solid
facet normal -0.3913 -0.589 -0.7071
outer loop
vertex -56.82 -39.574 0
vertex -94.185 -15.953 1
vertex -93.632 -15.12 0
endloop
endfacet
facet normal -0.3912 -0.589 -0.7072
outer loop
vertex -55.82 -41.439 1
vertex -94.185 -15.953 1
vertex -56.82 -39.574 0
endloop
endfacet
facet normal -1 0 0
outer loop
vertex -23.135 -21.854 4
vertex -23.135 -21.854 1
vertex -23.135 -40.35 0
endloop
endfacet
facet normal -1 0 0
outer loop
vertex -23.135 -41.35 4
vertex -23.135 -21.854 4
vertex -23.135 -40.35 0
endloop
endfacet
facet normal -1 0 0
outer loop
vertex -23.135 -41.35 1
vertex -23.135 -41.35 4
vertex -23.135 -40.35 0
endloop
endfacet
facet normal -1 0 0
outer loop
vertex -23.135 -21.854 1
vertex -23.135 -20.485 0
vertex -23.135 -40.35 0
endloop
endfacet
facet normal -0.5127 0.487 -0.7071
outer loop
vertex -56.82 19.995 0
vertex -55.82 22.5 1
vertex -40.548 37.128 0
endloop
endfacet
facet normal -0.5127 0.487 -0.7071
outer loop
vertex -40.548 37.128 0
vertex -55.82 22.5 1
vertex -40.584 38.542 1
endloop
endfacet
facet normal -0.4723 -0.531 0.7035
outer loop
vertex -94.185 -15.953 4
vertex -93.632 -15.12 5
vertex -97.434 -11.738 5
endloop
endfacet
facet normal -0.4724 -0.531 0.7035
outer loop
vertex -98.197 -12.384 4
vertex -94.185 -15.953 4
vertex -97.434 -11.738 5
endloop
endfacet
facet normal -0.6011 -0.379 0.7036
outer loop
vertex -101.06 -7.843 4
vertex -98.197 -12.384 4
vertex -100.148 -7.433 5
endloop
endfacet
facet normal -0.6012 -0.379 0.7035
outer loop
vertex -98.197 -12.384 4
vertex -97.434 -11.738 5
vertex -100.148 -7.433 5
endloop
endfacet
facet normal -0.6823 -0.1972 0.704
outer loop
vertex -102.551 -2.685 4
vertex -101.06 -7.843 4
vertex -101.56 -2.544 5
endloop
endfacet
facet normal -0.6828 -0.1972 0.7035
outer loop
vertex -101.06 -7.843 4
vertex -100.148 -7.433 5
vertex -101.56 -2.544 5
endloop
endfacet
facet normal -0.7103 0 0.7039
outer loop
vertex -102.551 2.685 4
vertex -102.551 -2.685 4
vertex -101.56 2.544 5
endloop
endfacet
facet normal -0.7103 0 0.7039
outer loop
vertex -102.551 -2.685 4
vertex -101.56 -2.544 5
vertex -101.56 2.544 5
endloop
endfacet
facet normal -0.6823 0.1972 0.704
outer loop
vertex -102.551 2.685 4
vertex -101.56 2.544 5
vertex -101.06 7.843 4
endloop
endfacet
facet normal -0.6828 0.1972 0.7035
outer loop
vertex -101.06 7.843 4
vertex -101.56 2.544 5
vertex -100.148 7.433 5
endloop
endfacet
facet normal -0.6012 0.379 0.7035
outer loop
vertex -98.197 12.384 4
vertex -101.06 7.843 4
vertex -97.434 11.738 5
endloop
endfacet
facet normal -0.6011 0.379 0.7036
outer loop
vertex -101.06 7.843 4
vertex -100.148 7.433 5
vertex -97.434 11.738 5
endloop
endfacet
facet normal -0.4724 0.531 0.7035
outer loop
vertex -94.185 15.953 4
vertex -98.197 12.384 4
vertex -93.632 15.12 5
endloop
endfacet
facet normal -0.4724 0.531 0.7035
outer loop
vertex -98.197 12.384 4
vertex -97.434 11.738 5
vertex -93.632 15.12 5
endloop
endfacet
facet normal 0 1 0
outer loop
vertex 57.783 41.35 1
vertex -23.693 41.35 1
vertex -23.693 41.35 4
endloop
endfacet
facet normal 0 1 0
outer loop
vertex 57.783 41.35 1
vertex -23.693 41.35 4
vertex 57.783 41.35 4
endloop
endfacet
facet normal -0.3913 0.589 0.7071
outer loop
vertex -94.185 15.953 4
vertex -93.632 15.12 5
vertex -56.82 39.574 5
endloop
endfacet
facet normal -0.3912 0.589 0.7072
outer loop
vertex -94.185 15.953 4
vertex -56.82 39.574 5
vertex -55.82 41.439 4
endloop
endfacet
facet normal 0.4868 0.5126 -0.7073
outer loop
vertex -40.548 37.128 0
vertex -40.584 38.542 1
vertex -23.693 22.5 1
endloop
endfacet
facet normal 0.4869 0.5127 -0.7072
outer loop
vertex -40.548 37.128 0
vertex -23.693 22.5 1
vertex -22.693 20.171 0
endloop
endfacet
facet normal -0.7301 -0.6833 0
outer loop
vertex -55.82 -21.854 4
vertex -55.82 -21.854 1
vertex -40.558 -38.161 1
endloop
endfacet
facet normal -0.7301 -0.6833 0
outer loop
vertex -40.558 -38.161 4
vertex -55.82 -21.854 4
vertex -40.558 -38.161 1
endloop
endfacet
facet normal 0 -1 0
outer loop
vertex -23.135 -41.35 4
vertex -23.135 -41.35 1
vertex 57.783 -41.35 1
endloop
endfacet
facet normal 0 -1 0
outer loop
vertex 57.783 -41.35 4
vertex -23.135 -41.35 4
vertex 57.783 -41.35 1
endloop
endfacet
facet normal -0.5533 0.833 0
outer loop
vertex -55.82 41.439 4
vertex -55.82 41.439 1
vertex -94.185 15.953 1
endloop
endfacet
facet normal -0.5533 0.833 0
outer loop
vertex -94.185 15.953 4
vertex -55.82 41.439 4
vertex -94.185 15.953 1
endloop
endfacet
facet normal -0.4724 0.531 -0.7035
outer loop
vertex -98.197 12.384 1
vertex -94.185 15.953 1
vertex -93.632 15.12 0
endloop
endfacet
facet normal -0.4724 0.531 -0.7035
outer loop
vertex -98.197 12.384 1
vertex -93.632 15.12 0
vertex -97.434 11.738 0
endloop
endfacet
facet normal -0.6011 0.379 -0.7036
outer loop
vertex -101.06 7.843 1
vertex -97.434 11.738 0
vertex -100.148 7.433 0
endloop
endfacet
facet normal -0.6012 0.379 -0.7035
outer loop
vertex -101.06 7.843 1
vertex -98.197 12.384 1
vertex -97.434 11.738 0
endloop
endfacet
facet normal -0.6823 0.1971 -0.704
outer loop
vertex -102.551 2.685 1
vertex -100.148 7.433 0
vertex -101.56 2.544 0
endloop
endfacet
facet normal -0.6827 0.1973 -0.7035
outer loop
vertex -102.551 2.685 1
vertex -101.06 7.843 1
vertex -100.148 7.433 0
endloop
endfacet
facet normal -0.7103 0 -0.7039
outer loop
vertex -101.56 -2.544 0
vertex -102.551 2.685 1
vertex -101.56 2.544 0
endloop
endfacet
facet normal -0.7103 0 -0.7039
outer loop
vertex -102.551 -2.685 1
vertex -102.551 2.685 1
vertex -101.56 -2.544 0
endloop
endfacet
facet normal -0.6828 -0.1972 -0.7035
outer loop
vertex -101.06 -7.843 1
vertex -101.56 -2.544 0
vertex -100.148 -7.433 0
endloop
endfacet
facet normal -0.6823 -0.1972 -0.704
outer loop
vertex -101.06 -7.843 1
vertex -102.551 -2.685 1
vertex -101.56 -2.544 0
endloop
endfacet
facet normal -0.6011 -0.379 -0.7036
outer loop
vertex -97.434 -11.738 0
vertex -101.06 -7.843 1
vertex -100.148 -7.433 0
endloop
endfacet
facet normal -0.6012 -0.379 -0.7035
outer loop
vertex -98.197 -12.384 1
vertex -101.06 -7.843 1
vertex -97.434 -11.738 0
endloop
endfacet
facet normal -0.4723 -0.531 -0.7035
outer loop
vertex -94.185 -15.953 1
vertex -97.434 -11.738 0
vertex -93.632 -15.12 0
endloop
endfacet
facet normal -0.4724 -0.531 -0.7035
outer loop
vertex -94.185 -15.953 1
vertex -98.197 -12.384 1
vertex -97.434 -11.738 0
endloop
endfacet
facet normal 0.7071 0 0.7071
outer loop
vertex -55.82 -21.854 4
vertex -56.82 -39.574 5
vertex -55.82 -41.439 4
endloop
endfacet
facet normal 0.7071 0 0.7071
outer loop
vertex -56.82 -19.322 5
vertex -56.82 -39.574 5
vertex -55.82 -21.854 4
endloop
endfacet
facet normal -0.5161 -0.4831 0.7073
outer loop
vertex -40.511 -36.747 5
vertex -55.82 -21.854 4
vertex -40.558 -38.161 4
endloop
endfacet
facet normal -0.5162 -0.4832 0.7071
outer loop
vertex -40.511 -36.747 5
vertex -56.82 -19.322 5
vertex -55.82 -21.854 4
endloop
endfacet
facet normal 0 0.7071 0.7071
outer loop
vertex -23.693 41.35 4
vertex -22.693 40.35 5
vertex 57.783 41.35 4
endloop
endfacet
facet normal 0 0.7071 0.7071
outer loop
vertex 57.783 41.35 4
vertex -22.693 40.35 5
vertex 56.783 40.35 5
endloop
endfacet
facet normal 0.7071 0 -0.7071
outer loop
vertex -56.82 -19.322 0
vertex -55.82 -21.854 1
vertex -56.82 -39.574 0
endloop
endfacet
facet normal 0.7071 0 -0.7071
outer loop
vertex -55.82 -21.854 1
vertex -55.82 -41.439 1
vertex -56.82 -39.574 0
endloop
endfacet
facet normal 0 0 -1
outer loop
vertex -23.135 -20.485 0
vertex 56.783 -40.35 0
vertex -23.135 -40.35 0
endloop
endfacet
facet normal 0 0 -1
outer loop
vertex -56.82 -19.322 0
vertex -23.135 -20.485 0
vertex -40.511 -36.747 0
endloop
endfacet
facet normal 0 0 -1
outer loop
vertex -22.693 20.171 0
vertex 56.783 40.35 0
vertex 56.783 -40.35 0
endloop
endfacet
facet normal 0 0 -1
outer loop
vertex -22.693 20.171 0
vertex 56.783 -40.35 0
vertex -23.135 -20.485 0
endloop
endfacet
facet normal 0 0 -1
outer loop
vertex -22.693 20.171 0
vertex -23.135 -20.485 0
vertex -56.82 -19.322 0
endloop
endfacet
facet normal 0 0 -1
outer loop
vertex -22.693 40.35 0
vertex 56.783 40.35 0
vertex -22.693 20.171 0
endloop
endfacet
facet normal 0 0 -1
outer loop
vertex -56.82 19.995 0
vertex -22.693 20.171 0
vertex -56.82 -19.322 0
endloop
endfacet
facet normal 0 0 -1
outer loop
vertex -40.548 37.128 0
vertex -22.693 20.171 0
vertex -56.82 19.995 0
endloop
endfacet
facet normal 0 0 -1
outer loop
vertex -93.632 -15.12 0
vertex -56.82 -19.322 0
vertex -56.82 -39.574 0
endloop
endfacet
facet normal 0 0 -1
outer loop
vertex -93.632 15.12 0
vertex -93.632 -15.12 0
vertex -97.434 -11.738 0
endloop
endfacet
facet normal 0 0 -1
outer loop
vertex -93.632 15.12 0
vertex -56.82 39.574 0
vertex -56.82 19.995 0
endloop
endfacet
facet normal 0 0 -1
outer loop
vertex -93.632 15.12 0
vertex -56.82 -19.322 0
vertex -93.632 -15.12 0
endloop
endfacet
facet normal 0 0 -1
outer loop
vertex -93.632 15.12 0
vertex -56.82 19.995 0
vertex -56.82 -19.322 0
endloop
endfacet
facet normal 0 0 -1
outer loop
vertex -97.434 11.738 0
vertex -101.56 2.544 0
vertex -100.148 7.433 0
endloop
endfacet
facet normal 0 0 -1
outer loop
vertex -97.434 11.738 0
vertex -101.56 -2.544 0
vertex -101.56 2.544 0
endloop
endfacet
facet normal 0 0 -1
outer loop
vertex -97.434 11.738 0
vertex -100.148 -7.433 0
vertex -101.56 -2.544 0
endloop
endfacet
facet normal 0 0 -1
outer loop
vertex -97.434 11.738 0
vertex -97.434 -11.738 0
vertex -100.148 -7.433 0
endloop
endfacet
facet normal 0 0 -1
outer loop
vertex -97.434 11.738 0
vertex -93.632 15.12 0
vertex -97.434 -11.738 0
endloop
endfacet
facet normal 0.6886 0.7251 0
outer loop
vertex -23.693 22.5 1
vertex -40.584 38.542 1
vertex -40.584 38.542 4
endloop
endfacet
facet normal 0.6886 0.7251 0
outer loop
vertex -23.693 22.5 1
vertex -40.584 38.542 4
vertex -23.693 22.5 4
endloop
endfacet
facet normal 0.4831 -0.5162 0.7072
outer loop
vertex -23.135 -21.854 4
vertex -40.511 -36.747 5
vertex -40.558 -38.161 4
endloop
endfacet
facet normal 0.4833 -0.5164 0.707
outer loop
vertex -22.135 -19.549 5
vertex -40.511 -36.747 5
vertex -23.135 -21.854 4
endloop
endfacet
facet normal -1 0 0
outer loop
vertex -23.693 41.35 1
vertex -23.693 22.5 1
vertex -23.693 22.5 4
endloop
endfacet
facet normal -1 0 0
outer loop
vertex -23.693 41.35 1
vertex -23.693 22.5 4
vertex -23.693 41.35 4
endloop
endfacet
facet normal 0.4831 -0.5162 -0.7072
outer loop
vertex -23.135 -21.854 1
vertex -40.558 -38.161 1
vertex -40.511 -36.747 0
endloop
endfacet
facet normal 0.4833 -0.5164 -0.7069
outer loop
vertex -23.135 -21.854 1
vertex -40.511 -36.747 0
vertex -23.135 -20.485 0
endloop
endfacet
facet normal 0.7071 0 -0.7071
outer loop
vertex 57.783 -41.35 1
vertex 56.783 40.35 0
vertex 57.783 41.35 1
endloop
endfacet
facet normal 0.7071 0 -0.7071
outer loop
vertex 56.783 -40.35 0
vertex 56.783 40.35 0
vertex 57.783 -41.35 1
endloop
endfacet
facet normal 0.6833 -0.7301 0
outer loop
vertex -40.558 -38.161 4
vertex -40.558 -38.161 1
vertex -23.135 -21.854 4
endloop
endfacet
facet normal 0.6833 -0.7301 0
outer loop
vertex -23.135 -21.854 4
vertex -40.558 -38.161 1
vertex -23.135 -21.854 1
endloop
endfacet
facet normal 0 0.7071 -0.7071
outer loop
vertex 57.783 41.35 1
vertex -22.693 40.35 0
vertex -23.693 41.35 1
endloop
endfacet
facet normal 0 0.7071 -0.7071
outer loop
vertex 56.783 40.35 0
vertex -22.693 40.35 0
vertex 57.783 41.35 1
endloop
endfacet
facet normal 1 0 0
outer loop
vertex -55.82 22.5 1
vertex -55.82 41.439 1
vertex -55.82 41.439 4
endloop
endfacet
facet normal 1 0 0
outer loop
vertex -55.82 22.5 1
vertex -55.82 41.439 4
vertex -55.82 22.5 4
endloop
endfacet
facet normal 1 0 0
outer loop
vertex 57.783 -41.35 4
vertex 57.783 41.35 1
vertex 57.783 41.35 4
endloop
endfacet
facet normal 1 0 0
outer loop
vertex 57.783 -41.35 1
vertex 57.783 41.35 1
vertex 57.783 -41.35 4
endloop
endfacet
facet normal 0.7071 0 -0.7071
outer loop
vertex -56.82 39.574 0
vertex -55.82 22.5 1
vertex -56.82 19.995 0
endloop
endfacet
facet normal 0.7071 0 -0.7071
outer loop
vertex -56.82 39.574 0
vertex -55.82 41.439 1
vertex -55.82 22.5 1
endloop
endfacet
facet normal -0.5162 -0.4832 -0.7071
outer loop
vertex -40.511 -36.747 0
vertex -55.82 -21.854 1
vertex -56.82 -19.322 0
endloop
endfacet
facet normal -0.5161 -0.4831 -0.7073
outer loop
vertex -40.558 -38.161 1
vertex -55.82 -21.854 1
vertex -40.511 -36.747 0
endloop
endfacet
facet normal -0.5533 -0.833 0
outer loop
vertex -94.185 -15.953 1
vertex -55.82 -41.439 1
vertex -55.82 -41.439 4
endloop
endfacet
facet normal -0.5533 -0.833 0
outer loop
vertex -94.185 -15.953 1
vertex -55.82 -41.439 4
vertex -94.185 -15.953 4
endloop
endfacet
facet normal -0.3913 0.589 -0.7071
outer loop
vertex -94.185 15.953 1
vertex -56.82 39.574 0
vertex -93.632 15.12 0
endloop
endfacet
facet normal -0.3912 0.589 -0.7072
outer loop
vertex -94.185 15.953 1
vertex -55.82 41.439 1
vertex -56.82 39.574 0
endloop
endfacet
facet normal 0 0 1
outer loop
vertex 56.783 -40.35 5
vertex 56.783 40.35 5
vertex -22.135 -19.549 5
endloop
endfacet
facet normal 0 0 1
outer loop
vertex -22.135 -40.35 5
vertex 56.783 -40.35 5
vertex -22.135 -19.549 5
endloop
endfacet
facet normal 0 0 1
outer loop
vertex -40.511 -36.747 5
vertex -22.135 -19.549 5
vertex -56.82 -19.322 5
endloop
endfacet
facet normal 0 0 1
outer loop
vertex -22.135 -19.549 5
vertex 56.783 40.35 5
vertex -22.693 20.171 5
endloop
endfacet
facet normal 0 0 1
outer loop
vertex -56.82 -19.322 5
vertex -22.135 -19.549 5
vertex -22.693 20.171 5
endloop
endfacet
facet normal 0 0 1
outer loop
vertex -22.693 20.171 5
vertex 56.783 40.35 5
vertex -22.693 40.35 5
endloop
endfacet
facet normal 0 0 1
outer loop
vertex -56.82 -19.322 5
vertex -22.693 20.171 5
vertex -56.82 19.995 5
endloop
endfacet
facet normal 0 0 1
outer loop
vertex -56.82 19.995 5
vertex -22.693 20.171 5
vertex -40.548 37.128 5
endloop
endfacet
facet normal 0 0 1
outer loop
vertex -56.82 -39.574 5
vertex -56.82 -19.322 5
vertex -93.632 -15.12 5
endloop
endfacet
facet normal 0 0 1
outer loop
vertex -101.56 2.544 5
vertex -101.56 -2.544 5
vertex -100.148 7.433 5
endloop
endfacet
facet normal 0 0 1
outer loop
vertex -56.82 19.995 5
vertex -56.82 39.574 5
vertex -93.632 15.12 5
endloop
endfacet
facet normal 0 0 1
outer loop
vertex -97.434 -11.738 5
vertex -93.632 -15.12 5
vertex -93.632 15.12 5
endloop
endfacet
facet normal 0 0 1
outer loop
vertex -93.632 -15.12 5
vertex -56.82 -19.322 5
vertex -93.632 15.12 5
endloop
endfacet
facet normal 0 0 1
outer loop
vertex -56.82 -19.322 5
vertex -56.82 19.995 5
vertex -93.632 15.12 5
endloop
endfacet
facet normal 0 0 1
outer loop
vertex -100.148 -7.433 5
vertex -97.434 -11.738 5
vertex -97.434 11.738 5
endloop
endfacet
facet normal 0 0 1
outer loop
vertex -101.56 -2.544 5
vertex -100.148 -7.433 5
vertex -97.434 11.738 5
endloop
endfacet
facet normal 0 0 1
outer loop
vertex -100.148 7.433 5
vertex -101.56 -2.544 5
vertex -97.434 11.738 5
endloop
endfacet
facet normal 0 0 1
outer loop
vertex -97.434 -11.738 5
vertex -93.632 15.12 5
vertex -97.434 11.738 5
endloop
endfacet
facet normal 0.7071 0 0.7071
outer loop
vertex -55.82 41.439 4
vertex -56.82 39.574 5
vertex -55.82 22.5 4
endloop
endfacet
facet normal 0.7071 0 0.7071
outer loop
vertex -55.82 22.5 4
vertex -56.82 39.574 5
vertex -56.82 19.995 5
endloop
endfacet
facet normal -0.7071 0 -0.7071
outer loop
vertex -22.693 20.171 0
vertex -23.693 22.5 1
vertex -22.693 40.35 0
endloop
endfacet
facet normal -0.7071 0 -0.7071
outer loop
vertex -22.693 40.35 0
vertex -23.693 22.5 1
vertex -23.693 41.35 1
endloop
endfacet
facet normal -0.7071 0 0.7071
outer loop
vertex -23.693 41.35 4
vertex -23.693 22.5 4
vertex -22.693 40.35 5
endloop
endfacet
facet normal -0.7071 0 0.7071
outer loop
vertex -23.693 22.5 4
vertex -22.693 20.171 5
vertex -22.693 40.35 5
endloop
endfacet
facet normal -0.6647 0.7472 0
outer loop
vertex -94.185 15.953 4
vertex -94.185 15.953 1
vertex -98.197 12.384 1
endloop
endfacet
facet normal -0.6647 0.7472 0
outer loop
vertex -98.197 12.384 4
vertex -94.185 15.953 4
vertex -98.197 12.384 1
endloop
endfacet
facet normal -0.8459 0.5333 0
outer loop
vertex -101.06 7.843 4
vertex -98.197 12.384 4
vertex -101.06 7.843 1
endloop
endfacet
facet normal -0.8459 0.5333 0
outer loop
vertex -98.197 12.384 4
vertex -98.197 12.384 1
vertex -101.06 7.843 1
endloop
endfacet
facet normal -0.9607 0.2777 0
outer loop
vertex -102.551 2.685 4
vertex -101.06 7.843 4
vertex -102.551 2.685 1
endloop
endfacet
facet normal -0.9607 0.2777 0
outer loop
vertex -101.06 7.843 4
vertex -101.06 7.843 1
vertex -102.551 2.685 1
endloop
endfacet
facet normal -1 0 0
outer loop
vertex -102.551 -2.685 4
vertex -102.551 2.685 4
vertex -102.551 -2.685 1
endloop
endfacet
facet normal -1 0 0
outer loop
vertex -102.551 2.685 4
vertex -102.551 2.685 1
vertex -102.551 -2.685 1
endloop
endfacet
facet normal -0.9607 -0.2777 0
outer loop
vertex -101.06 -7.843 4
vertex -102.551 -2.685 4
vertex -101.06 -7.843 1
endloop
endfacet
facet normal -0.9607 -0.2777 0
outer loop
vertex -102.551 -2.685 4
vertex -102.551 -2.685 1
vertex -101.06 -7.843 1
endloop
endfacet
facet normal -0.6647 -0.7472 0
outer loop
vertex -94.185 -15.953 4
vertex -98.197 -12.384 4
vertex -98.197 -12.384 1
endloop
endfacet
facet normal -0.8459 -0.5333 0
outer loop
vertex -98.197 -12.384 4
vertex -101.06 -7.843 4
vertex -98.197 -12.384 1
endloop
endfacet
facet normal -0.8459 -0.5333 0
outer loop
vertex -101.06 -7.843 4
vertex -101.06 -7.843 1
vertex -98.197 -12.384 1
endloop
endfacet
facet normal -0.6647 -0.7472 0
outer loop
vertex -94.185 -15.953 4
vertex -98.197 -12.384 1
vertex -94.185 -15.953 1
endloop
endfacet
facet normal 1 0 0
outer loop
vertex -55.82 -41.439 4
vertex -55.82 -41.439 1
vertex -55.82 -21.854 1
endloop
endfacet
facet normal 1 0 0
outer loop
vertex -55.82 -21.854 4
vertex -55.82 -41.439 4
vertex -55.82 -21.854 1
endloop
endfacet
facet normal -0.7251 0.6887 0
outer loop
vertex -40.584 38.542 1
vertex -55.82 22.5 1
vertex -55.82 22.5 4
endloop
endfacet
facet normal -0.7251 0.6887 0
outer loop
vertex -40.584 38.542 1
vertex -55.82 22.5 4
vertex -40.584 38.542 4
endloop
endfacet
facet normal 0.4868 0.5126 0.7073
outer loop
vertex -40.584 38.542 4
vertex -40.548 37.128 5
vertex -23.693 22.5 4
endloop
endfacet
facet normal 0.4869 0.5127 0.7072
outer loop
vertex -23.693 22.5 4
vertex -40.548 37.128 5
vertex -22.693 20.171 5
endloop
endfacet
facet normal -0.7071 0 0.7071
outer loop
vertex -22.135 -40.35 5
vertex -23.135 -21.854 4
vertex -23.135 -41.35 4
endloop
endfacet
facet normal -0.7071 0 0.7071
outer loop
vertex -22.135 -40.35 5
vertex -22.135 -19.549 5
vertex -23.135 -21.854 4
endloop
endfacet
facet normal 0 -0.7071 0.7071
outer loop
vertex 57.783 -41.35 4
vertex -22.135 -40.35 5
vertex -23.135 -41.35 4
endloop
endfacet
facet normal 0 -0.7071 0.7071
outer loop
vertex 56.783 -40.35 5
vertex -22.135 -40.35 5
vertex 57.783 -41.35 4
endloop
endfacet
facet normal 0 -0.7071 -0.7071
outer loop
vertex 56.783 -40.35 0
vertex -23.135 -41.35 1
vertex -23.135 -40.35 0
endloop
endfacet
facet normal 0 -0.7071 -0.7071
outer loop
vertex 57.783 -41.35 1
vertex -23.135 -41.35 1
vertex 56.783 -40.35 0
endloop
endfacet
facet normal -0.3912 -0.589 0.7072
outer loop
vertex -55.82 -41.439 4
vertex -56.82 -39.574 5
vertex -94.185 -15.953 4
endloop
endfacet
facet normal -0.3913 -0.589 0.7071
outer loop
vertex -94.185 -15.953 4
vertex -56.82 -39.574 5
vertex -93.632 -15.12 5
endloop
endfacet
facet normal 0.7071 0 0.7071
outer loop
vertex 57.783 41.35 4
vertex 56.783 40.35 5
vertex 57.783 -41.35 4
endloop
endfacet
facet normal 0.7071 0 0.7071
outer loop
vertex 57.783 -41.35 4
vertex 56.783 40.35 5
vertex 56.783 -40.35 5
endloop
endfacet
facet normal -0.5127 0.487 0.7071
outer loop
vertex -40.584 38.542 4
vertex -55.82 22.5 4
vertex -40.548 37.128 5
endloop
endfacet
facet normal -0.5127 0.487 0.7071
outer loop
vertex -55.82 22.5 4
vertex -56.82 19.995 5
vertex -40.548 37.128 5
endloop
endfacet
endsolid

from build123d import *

# Parameters (mm, degrees)
PAD_DEPTH       = 5
CHAMFER_SIZE    = 1
CHAMFER001_SIZE = 1


with BuildPart() as part:
    # Sketch → Pad (new body)
    with BuildSketch(Plane.XY):
        with BuildLine():
            Line((57.783013, 41.350446), (57.783013, -41.350446))
            Line((-23.135408, -41.350446), (57.783013, -41.350446))
            Line((-23.135408, -21.854214), (-23.135408, -41.350446))
            Line((-40.557513, -38.160834), (-23.135408, -21.854214))
            Line((-55.820071, -21.854214), (-40.557513, -38.160834))
            Line((-55.820071, -41.438588), (-55.820071, -21.854214))
            Line((-55.820071, -41.438588), (-94.185086, -15.952922))
            ThreePointArc((-94.185086, 15.952922), (-102.739709, 0), (-94.185086, -15.952922))
            Line((-55.820071, 41.438588), (-94.185086, 15.952922))
            Line((-55.820071, 41.438588), (-55.820071, 22.499577))
            Line((-55.820071, 22.499577), (-40.584183, 38.541902))
            Line((-40.584183, 38.541902), (-23.692736, 22.499577))
            Line((-23.692736, 22.499577), (-23.692736, 41.350446))
            Line((-23.692736, 41.350446), (57.783013, 41.350446))
        make_face()
    extrude(amount=PAD_DEPTH)

    # Chamfer
    chamfer_edges = [part.edges().sort_by_distance(p)[0] for p in [
        (-55.820071, 31.969082, 5),
        (-48.202127, 30.52074, 5),
        (-32.138459, 30.52074, 5),
        (-23.692736, 31.925012, 5),
        (17.045139, 41.350446, 5),
        (57.783013, 0, 5),
        (17.323802, -41.350446, 5),
        (-23.135408, -31.60233, 5),
        (-31.846461, -30.007524, 5),
        (-48.188792, -30.007524, 5),
        (-55.820071, -31.646401, 5),
        (-75.002579, -28.695755, 5),
        (-102.739709, 0, 5),
        (-75.002579, 28.695755, 5),
    ]]
    chamfer(chamfer_edges, length=CHAMFER_SIZE)

    # Chamfer001
    chamfer001_edges = [part.edges().sort_by_distance(p)[0] for p in [
        (-55.820071, 31.969082, 0),
        (-75.002579, 28.695755, 0),
        (-48.202127, 30.52074, 0),
        (-32.138459, 30.52074, 0),
        (-23.692736, 31.925012, 0),
        (17.045139, 41.350446, 0),
        (57.783013, 0, 0),
        (17.323802, -41.350446, 0),
        (-31.846461, -30.007524, 0),
        (-48.188792, -30.007524, 0),
        (-55.820071, -31.646401, 0),
        (-75.002579, -28.695755, 0),
        (-102.739709, 0, 0),
    ]]
    chamfer(chamfer001_edges, length=CHAMFER001_SIZE)


solid = part.part
